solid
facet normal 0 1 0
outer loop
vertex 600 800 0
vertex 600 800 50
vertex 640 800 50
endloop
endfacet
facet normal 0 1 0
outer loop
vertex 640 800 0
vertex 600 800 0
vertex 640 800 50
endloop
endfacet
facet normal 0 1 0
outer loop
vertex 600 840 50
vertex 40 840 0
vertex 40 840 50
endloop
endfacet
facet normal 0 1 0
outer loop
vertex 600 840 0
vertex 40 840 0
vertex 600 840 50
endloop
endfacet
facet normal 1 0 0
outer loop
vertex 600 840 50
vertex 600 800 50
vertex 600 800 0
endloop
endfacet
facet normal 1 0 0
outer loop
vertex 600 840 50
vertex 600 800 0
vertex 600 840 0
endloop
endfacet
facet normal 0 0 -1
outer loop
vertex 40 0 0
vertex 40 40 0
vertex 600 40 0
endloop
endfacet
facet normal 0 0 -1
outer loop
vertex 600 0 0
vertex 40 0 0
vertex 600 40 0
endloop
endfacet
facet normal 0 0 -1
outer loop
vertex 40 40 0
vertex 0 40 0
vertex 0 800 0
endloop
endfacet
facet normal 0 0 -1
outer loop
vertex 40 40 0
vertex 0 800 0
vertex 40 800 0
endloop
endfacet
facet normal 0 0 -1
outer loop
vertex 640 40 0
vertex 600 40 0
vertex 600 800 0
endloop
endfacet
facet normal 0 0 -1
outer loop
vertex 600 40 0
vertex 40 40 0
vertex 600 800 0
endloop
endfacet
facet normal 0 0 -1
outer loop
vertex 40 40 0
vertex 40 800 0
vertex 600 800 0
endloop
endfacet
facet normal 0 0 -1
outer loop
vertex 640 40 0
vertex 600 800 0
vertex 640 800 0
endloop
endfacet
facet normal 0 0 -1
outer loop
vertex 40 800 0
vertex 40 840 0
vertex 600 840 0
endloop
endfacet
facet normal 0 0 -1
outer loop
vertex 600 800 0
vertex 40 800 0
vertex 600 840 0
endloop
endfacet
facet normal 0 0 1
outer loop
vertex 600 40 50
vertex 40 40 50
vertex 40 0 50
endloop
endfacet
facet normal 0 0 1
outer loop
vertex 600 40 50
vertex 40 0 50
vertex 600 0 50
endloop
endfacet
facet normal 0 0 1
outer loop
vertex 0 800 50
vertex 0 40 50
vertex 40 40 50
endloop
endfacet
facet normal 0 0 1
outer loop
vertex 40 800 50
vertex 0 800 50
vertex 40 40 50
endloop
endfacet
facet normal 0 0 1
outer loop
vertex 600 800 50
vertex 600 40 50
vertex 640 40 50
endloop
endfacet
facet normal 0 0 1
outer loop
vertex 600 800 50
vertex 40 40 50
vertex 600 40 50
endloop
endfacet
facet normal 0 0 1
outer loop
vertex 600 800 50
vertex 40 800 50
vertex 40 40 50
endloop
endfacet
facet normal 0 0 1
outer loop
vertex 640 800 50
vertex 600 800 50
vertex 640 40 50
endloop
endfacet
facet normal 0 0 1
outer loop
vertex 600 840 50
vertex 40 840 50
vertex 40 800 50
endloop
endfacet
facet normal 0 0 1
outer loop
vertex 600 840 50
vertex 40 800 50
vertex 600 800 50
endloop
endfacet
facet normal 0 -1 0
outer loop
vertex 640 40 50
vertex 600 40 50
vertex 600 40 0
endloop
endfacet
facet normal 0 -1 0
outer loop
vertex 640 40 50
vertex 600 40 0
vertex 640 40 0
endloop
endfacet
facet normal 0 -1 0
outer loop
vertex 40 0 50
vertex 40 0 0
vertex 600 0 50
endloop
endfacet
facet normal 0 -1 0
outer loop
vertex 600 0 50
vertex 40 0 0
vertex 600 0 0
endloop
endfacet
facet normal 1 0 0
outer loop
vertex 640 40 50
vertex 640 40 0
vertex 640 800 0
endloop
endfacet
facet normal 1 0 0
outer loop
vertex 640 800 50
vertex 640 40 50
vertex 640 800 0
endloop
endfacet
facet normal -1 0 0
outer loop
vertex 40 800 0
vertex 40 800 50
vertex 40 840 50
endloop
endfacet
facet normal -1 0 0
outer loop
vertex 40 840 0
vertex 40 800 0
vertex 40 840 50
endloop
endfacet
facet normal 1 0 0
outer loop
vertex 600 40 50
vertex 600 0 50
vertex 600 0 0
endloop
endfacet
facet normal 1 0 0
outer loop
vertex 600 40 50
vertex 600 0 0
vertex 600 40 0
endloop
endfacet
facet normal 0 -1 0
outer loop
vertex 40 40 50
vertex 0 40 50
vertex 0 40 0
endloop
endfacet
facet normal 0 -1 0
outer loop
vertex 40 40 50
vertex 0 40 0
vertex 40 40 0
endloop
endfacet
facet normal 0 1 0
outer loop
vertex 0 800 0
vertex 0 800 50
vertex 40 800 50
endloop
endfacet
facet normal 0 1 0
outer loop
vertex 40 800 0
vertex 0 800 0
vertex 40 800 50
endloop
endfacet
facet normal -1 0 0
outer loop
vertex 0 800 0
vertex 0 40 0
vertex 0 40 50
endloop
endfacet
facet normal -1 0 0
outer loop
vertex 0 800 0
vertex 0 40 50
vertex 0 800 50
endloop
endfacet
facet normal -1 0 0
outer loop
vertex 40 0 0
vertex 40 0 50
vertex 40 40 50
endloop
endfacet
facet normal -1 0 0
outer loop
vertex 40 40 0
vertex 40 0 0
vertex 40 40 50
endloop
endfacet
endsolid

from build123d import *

# Parameters (mm, degrees)
SKETCH1_W           = 640
SKETCH1_H           = 840
BOSS_EXTRUDE1_DEPTH = 50
CUT_EXTRUDE1_REACH  = 1059.213
SKETCH2_W           = 40
SKETCH2_H           = 40


with BuildPart() as part:
    # Sketch1 → Boss-Extrude1 (new body)
    with BuildSketch(Plane.XY):
        with Locations((320, 420)):
            Rectangle(SKETCH1_W, SKETCH1_H)
    extrude(amount=BOSS_EXTRUDE1_DEPTH)

    # Sketch2 → Cut-Extrude1 (cut, up to next)
    with BuildSketch(Plane.XY.offset(50), mode=Mode.PRIVATE) as cut_extrude1_sk1:
        with Locations((20, 20)):
            Rectangle(SKETCH2_W, SKETCH2_H)
    cut_extrude1_tool1 = extrude(cut_extrude1_sk1.sketch, amount=-CUT_EXTRUDE1_REACH, mode=Mode.PRIVATE) & part.part
    # Sketch2 → Cut-Extrude1 (cut, up to next)
    with BuildSketch(Plane.XY.offset(50), mode=Mode.PRIVATE) as cut_extrude1_sk2:
        with Locations((620, 20)):
            Rectangle(SKETCH2_W, SKETCH2_H)
    cut_extrude1_tool2 = extrude(cut_extrude1_sk2.sketch, amount=-CUT_EXTRUDE1_REACH, mode=Mode.PRIVATE) & part.part
    # Sketch2 → Cut-Extrude1 (cut, up to next)
    with BuildSketch(Plane.XY.offset(50), mode=Mode.PRIVATE) as cut_extrude1_sk3:
        with Locations((620, 820)):
            Rectangle(SKETCH2_W, SKETCH2_H)
    cut_extrude1_tool3 = extrude(cut_extrude1_sk3.sketch, amount=-CUT_EXTRUDE1_REACH, mode=Mode.PRIVATE) & part.part
    # Sketch2 → Cut-Extrude1 (cut, up to next)
    with BuildSketch(Plane.XY.offset(50), mode=Mode.PRIVATE) as cut_extrude1_sk4:
        with Locations((20, 820)):
            Rectangle(SKETCH2_W, SKETCH2_H)
    cut_extrude1_tool4 = extrude(cut_extrude1_sk4.sketch, amount=-CUT_EXTRUDE1_REACH, mode=Mode.PRIVATE) & part.part
    add(cut_extrude1_tool1.solids().sort_by_distance((20, 20, 50))[0], mode=Mode.SUBTRACT)
    add(cut_extrude1_tool2.solids().sort_by_distance((620, 20, 50))[0], mode=Mode.SUBTRACT)
    add(cut_extrude1_tool3.solids().sort_by_distance((620, 820, 50))[0], mode=Mode.SUBTRACT)
    add(cut_extrude1_tool4.solids().sort_by_distance((20, 820, 50))[0], mode=Mode.SUBTRACT)


solid = part.part
